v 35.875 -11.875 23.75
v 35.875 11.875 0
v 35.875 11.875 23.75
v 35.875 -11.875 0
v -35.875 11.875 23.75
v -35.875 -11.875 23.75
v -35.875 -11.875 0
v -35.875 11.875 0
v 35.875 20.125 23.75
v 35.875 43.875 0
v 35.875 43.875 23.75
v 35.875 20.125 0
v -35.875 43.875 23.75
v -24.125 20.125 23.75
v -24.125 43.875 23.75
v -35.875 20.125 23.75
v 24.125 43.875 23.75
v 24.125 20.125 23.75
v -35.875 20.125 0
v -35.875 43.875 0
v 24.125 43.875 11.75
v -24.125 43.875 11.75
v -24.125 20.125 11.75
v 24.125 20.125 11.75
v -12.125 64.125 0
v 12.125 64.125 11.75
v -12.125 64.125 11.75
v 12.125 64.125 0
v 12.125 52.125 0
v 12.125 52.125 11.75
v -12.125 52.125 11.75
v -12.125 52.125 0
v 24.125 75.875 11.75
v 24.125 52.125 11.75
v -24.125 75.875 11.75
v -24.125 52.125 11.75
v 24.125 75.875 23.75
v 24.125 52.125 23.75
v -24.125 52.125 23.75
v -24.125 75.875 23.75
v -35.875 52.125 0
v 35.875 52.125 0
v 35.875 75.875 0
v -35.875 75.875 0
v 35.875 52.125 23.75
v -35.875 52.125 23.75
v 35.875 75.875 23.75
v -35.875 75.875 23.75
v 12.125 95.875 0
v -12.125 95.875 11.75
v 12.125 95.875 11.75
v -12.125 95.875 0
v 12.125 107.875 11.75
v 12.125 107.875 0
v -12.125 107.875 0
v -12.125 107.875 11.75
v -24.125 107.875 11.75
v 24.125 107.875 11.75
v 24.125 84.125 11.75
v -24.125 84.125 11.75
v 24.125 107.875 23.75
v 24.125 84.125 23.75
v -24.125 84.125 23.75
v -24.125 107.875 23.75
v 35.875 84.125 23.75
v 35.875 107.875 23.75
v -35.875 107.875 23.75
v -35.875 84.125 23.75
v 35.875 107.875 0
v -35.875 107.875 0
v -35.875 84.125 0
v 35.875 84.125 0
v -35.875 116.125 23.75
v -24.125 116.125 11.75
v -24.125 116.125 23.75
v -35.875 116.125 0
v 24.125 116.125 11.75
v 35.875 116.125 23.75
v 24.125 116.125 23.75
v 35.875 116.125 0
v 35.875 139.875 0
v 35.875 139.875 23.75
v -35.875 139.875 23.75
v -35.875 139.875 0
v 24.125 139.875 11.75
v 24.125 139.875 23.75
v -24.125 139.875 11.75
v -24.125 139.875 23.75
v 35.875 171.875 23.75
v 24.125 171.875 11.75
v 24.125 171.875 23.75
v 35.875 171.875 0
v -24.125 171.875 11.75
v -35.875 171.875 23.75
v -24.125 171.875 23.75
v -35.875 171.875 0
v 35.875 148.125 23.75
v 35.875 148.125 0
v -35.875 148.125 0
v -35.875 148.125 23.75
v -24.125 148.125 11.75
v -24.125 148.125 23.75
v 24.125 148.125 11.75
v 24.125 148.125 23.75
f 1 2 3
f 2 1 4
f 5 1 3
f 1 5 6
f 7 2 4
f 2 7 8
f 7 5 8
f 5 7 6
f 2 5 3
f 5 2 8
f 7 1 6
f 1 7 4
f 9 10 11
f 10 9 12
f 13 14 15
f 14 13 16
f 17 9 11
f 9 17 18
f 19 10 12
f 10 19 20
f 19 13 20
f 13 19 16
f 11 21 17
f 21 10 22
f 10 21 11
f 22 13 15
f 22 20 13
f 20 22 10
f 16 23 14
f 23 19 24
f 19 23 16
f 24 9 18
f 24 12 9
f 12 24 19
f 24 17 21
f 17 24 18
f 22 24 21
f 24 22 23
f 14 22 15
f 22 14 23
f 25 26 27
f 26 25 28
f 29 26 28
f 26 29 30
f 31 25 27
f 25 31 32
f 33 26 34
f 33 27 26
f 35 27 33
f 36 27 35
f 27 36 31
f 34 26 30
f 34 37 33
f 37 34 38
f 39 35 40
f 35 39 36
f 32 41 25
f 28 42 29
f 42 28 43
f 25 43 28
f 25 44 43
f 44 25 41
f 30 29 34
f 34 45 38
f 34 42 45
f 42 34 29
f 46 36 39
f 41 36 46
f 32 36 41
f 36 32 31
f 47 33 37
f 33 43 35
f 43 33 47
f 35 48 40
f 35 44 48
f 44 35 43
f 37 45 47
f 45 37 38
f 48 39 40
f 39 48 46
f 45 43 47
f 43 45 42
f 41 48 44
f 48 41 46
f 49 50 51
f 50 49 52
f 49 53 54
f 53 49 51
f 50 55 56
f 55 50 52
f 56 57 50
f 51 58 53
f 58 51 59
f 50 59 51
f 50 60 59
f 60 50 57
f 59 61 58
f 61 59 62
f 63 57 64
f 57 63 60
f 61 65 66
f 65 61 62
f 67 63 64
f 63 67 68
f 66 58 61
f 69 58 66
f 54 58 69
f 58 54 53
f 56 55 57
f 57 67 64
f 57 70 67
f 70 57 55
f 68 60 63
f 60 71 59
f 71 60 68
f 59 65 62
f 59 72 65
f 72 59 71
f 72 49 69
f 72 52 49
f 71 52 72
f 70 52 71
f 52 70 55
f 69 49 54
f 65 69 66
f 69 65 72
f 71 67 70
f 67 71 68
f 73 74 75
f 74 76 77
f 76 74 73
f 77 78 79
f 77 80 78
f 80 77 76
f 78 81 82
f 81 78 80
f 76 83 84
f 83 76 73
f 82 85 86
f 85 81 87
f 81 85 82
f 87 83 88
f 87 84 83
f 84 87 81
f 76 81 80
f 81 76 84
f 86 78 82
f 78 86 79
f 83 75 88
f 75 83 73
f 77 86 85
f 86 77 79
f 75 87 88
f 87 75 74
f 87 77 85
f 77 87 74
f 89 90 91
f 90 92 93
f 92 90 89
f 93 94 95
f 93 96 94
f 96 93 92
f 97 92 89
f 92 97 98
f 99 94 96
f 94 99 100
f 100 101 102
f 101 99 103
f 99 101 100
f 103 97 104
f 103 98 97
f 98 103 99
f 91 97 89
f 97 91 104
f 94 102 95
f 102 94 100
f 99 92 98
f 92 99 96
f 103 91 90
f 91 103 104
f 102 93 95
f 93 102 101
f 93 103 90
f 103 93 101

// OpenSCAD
// @name Six-Piece Burr Puzzle
// @description Classic interlocking six-piece burr with one solid key piece and a printable fit clearance.
// @tags puzzle, burr, interlocking, toy, classic
//
// A classic notchable six-piece burr (2x2x6-unit sticks). The piece set
// was derived from the pairwise overlap blocks of the six assembled
// sticks and verified solvable by exhaustive straight-slide search:
//
//   - 1x KEY (piece 0): completely solid stick.
//   - 3x HALF-LAP (pieces 1, 4, 5): a notch 2 units long, full width,
//     half depth, centered on one face (the classic "simple notch"
//     piece, cut over the central 4 half-units).
//   - 2x CORNER (pieces 2, 3): a half-lap along the inner face over the
//     central 4 half-units, plus a full-thickness half-depth notch for
//     the key. The two are mirror images, but the shape is y-symmetric,
//     so they are the SAME printed part (one is rotated 180 degrees).
//
// Interlock (verified by search + boolean intersection tests): in the
// assembled state only the key can move, sliding out along its own
// axis (+x). Every other piece is blocked on all six directions until
// the key is removed.
//
// Disassembly: key +x  ->  corner B1 +z  ->  corner B2 +z  ->
//              lap A2 +x  ->  lap C1 +x  ->  lap C2 free.
// Assembly is the reverse.
//
// Printing: every piece lies flat on the plate with all notches facing
// up or cut clear through - vertical walls only, no supports, no
// bridges. Fit is controlled by fit_clearance: every piece is shrunk
// by clearance/2 per face and every notch is enlarged by clearance/2
// per face, so any two mating surfaces are separated by exactly
// fit_clearance.

/* [Puzzle Size] */
// Stick cross-section width (mm) - the puzzle is ~3x this across
stick_size = 24; // [12:2:40]

// Stick length as a multiple of the cross-section (3 = classic 2x2x6)
length_ratio = 3; // [2.5:0.25:4]

/* [Fit] */
// Clearance between mating faces (mm). 0.25 suits most FDM printers; increase for a looser fit.
fit_clearance = 0.25; // [0.1:0.05:0.6]

/* [Print Layout] */
// Gap between pieces on the plate (mm)
part_gap = 8; // [4:1:15]

/* [Display] */
// What to show
_display_mode = "all"; // ["all", "pieces", "assembled"]

// ---- Derived geometry ----

// Half-unit: sticks are 2u x 2u in cross-section, notches are on a u grid
_u = stick_size / 2;
// Half-length of a stick
_hl = length_ratio * stick_size / 2;
// Per-face inset/outset that realizes the clearance
_c2 = fit_clearance / 2;

assert(length_ratio >= 2.5,
    str("length_ratio ", length_ratio, " too short: notches span the central 4 half-units (2x stick_size)"));
assert(fit_clearance < _u / 2,
    str("fit_clearance ", fit_clearance, " too large for stick_size ", stick_size));

// Piece order: 0=A1 key (x axis, top), 1=A2 (x axis, bottom),
// 2=B1 (y axis, +x side), 3=B2 (y axis, -x side),
// 4=C1 (z axis, +y side), 5=C2 (z axis, -y side)

// Blanks as [min_corner, max_corner] in mm (assembled frame)
_blanks = [
    [[-_hl, -_u,     0], [ _hl,  _u, 2*_u]],   // A1 key
    [[-_hl, -_u, -2*_u], [ _hl,  _u,    0]],   // A2
    [[    0, -_hl, -_u], [2*_u,  _hl,  _u]],   // B1
    [[-2*_u, -_hl, -_u], [   0,  _hl,  _u]],   // B2
    [[ -_u,     0, -_hl], [ _u, 2*_u,  _hl]],  // C1
    [[ -_u, -2*_u, -_hl], [ _u,    0,  _hl]],  // C2
];

// Notch boxes per piece (assembled frame). Each is the union of the
// overlap blocks assigned to that piece by the verified solution.
_notches = [
    [],                                                              // A1: solid key
    [[[-2*_u, -_u, -_u], [2*_u, _u, 0]]],                            // A2: half-lap, opens +z
    [[[0, -_u, 0], [2*_u, _u, _u]],                                  // B1: key notch, opens +z
     [[0, -2*_u, -_u], [_u, 2*_u, _u]]],                             // B1: inner lap, opens -x
    [[[-2*_u, -_u, 0], [0, _u, _u]],                                 // B2: key notch, opens +z
     [[-_u, -2*_u, -_u], [0, 2*_u, _u]]],                            // B2: inner lap, opens +x
    [[[-_u, 0, -2*_u], [_u, _u, 2*_u]]],                             // C1: half-lap, opens -y
    [[[-_u, -_u, -2*_u], [_u, 0, 2*_u]]],                            // C2: half-lap, opens +y
];

_colors = ["Gold", "DodgerBlue", "Tomato", "LimeGreen", "Orchid", "SlateGray"];

// ---- Accessors (also used by the verification harness) ----

function burr_piece_count() = 6;
function burr_stick_len() = 2 * _hl;
function burr_unit() = _u;
function burr_clearance() = fit_clearance;
// Extraction axis of the key (piece 0): +x
function burr_key_axis() = [1, 0, 0];

// ---- Modules ----

// A box from [min,max] corners, grown by g on every face
module _box(b, g) {
    translate([b[0][0] - g, b[0][1] - g, b[0][2] - g])
        cube([b[1][0] - b[0][0] + 2*g,
              b[1][1] - b[0][1] + 2*g,
              b[1][2] - b[0][2] + 2*g]);
}

// One puzzle piece in its assembled position/orientation.
// Blank shrunk by clearance/2 per face; notches grown by clearance/2
// per face (which also makes every cutter overshoot the surface).
module burr_piece(i) {
    difference() {
        _box(_blanks[i], -_c2);
        for (n = _notches[i]) _box(n, _c2);
    }
}

// Union of all pieces except piece i (for intersection tests)
module burr_others(i) {
    for (j = [0:5]) if (j != i) burr_piece(j);
}

module show_assembled() {
    for (i = [0:5]) color(_colors[i]) burr_piece(i);
}

// Print pose: rotate piece i so its stick axis lies along x and every
// notch opens upward or cuts clear through, then rest it on the plate.
// Rotations are proper (det +1) - verified per piece in the header.
module _print_pose(i) {
    if (i == 0 || i == 1) {
        // A pieces: axis already x; A1 sits at z[0,2u], A2 at z[-2u,0]
        // with its lap opening +z (up).
        translate([0, 0, (i == 0 ? 0 : 2*_u) - _c2]) children();
    } else if (i == 2) {
        // B1: axis y->x, inner face (x=0) up: (x,y,z) -> (y,-z,-x)
        translate([0, 0, 2*_u - _c2]) rotate([90, 0, 0]) rotate([0, 0, -90]) children();
    } else if (i == 3) {
        // B2: axis y->x, inner face (x=0) up: (x,y,z) -> (y,z,x)
        translate([0, 0, 2*_u - _c2]) rotate([-90, 0, 0]) rotate([0, 0, -90]) children();
    } else if (i == 4) {
        // C1: axis z->x, lap face (y=0) up: (x,y,z) -> (z,-x,-y)
        translate([0, 0, 2*_u - _c2]) rotate([-90, 0, 0]) rotate([0, 90, 0]) children();
    } else {
        // C2: axis z->x, lap face (y=0) up: (x,y,z) -> (z,x,y)
        translate([0, 0, 2*_u - _c2]) rotate([90, 0, 0]) rotate([0, 90, 0]) children();
    }
}

module show_print_layout() {
    for (i = [0:5])
        color(_colors[i])
            translate([0, i * (2*_u + part_gap), 0])
                _print_pose(i) burr_piece(i);
}

// ---- Dispatch ----

if (_display_mode == "all") {
    show_print_layout();
} else if (_display_mode == "pieces") {
    show_print_layout();
} else if (_display_mode == "assembled") {
    show_assembled();
}
